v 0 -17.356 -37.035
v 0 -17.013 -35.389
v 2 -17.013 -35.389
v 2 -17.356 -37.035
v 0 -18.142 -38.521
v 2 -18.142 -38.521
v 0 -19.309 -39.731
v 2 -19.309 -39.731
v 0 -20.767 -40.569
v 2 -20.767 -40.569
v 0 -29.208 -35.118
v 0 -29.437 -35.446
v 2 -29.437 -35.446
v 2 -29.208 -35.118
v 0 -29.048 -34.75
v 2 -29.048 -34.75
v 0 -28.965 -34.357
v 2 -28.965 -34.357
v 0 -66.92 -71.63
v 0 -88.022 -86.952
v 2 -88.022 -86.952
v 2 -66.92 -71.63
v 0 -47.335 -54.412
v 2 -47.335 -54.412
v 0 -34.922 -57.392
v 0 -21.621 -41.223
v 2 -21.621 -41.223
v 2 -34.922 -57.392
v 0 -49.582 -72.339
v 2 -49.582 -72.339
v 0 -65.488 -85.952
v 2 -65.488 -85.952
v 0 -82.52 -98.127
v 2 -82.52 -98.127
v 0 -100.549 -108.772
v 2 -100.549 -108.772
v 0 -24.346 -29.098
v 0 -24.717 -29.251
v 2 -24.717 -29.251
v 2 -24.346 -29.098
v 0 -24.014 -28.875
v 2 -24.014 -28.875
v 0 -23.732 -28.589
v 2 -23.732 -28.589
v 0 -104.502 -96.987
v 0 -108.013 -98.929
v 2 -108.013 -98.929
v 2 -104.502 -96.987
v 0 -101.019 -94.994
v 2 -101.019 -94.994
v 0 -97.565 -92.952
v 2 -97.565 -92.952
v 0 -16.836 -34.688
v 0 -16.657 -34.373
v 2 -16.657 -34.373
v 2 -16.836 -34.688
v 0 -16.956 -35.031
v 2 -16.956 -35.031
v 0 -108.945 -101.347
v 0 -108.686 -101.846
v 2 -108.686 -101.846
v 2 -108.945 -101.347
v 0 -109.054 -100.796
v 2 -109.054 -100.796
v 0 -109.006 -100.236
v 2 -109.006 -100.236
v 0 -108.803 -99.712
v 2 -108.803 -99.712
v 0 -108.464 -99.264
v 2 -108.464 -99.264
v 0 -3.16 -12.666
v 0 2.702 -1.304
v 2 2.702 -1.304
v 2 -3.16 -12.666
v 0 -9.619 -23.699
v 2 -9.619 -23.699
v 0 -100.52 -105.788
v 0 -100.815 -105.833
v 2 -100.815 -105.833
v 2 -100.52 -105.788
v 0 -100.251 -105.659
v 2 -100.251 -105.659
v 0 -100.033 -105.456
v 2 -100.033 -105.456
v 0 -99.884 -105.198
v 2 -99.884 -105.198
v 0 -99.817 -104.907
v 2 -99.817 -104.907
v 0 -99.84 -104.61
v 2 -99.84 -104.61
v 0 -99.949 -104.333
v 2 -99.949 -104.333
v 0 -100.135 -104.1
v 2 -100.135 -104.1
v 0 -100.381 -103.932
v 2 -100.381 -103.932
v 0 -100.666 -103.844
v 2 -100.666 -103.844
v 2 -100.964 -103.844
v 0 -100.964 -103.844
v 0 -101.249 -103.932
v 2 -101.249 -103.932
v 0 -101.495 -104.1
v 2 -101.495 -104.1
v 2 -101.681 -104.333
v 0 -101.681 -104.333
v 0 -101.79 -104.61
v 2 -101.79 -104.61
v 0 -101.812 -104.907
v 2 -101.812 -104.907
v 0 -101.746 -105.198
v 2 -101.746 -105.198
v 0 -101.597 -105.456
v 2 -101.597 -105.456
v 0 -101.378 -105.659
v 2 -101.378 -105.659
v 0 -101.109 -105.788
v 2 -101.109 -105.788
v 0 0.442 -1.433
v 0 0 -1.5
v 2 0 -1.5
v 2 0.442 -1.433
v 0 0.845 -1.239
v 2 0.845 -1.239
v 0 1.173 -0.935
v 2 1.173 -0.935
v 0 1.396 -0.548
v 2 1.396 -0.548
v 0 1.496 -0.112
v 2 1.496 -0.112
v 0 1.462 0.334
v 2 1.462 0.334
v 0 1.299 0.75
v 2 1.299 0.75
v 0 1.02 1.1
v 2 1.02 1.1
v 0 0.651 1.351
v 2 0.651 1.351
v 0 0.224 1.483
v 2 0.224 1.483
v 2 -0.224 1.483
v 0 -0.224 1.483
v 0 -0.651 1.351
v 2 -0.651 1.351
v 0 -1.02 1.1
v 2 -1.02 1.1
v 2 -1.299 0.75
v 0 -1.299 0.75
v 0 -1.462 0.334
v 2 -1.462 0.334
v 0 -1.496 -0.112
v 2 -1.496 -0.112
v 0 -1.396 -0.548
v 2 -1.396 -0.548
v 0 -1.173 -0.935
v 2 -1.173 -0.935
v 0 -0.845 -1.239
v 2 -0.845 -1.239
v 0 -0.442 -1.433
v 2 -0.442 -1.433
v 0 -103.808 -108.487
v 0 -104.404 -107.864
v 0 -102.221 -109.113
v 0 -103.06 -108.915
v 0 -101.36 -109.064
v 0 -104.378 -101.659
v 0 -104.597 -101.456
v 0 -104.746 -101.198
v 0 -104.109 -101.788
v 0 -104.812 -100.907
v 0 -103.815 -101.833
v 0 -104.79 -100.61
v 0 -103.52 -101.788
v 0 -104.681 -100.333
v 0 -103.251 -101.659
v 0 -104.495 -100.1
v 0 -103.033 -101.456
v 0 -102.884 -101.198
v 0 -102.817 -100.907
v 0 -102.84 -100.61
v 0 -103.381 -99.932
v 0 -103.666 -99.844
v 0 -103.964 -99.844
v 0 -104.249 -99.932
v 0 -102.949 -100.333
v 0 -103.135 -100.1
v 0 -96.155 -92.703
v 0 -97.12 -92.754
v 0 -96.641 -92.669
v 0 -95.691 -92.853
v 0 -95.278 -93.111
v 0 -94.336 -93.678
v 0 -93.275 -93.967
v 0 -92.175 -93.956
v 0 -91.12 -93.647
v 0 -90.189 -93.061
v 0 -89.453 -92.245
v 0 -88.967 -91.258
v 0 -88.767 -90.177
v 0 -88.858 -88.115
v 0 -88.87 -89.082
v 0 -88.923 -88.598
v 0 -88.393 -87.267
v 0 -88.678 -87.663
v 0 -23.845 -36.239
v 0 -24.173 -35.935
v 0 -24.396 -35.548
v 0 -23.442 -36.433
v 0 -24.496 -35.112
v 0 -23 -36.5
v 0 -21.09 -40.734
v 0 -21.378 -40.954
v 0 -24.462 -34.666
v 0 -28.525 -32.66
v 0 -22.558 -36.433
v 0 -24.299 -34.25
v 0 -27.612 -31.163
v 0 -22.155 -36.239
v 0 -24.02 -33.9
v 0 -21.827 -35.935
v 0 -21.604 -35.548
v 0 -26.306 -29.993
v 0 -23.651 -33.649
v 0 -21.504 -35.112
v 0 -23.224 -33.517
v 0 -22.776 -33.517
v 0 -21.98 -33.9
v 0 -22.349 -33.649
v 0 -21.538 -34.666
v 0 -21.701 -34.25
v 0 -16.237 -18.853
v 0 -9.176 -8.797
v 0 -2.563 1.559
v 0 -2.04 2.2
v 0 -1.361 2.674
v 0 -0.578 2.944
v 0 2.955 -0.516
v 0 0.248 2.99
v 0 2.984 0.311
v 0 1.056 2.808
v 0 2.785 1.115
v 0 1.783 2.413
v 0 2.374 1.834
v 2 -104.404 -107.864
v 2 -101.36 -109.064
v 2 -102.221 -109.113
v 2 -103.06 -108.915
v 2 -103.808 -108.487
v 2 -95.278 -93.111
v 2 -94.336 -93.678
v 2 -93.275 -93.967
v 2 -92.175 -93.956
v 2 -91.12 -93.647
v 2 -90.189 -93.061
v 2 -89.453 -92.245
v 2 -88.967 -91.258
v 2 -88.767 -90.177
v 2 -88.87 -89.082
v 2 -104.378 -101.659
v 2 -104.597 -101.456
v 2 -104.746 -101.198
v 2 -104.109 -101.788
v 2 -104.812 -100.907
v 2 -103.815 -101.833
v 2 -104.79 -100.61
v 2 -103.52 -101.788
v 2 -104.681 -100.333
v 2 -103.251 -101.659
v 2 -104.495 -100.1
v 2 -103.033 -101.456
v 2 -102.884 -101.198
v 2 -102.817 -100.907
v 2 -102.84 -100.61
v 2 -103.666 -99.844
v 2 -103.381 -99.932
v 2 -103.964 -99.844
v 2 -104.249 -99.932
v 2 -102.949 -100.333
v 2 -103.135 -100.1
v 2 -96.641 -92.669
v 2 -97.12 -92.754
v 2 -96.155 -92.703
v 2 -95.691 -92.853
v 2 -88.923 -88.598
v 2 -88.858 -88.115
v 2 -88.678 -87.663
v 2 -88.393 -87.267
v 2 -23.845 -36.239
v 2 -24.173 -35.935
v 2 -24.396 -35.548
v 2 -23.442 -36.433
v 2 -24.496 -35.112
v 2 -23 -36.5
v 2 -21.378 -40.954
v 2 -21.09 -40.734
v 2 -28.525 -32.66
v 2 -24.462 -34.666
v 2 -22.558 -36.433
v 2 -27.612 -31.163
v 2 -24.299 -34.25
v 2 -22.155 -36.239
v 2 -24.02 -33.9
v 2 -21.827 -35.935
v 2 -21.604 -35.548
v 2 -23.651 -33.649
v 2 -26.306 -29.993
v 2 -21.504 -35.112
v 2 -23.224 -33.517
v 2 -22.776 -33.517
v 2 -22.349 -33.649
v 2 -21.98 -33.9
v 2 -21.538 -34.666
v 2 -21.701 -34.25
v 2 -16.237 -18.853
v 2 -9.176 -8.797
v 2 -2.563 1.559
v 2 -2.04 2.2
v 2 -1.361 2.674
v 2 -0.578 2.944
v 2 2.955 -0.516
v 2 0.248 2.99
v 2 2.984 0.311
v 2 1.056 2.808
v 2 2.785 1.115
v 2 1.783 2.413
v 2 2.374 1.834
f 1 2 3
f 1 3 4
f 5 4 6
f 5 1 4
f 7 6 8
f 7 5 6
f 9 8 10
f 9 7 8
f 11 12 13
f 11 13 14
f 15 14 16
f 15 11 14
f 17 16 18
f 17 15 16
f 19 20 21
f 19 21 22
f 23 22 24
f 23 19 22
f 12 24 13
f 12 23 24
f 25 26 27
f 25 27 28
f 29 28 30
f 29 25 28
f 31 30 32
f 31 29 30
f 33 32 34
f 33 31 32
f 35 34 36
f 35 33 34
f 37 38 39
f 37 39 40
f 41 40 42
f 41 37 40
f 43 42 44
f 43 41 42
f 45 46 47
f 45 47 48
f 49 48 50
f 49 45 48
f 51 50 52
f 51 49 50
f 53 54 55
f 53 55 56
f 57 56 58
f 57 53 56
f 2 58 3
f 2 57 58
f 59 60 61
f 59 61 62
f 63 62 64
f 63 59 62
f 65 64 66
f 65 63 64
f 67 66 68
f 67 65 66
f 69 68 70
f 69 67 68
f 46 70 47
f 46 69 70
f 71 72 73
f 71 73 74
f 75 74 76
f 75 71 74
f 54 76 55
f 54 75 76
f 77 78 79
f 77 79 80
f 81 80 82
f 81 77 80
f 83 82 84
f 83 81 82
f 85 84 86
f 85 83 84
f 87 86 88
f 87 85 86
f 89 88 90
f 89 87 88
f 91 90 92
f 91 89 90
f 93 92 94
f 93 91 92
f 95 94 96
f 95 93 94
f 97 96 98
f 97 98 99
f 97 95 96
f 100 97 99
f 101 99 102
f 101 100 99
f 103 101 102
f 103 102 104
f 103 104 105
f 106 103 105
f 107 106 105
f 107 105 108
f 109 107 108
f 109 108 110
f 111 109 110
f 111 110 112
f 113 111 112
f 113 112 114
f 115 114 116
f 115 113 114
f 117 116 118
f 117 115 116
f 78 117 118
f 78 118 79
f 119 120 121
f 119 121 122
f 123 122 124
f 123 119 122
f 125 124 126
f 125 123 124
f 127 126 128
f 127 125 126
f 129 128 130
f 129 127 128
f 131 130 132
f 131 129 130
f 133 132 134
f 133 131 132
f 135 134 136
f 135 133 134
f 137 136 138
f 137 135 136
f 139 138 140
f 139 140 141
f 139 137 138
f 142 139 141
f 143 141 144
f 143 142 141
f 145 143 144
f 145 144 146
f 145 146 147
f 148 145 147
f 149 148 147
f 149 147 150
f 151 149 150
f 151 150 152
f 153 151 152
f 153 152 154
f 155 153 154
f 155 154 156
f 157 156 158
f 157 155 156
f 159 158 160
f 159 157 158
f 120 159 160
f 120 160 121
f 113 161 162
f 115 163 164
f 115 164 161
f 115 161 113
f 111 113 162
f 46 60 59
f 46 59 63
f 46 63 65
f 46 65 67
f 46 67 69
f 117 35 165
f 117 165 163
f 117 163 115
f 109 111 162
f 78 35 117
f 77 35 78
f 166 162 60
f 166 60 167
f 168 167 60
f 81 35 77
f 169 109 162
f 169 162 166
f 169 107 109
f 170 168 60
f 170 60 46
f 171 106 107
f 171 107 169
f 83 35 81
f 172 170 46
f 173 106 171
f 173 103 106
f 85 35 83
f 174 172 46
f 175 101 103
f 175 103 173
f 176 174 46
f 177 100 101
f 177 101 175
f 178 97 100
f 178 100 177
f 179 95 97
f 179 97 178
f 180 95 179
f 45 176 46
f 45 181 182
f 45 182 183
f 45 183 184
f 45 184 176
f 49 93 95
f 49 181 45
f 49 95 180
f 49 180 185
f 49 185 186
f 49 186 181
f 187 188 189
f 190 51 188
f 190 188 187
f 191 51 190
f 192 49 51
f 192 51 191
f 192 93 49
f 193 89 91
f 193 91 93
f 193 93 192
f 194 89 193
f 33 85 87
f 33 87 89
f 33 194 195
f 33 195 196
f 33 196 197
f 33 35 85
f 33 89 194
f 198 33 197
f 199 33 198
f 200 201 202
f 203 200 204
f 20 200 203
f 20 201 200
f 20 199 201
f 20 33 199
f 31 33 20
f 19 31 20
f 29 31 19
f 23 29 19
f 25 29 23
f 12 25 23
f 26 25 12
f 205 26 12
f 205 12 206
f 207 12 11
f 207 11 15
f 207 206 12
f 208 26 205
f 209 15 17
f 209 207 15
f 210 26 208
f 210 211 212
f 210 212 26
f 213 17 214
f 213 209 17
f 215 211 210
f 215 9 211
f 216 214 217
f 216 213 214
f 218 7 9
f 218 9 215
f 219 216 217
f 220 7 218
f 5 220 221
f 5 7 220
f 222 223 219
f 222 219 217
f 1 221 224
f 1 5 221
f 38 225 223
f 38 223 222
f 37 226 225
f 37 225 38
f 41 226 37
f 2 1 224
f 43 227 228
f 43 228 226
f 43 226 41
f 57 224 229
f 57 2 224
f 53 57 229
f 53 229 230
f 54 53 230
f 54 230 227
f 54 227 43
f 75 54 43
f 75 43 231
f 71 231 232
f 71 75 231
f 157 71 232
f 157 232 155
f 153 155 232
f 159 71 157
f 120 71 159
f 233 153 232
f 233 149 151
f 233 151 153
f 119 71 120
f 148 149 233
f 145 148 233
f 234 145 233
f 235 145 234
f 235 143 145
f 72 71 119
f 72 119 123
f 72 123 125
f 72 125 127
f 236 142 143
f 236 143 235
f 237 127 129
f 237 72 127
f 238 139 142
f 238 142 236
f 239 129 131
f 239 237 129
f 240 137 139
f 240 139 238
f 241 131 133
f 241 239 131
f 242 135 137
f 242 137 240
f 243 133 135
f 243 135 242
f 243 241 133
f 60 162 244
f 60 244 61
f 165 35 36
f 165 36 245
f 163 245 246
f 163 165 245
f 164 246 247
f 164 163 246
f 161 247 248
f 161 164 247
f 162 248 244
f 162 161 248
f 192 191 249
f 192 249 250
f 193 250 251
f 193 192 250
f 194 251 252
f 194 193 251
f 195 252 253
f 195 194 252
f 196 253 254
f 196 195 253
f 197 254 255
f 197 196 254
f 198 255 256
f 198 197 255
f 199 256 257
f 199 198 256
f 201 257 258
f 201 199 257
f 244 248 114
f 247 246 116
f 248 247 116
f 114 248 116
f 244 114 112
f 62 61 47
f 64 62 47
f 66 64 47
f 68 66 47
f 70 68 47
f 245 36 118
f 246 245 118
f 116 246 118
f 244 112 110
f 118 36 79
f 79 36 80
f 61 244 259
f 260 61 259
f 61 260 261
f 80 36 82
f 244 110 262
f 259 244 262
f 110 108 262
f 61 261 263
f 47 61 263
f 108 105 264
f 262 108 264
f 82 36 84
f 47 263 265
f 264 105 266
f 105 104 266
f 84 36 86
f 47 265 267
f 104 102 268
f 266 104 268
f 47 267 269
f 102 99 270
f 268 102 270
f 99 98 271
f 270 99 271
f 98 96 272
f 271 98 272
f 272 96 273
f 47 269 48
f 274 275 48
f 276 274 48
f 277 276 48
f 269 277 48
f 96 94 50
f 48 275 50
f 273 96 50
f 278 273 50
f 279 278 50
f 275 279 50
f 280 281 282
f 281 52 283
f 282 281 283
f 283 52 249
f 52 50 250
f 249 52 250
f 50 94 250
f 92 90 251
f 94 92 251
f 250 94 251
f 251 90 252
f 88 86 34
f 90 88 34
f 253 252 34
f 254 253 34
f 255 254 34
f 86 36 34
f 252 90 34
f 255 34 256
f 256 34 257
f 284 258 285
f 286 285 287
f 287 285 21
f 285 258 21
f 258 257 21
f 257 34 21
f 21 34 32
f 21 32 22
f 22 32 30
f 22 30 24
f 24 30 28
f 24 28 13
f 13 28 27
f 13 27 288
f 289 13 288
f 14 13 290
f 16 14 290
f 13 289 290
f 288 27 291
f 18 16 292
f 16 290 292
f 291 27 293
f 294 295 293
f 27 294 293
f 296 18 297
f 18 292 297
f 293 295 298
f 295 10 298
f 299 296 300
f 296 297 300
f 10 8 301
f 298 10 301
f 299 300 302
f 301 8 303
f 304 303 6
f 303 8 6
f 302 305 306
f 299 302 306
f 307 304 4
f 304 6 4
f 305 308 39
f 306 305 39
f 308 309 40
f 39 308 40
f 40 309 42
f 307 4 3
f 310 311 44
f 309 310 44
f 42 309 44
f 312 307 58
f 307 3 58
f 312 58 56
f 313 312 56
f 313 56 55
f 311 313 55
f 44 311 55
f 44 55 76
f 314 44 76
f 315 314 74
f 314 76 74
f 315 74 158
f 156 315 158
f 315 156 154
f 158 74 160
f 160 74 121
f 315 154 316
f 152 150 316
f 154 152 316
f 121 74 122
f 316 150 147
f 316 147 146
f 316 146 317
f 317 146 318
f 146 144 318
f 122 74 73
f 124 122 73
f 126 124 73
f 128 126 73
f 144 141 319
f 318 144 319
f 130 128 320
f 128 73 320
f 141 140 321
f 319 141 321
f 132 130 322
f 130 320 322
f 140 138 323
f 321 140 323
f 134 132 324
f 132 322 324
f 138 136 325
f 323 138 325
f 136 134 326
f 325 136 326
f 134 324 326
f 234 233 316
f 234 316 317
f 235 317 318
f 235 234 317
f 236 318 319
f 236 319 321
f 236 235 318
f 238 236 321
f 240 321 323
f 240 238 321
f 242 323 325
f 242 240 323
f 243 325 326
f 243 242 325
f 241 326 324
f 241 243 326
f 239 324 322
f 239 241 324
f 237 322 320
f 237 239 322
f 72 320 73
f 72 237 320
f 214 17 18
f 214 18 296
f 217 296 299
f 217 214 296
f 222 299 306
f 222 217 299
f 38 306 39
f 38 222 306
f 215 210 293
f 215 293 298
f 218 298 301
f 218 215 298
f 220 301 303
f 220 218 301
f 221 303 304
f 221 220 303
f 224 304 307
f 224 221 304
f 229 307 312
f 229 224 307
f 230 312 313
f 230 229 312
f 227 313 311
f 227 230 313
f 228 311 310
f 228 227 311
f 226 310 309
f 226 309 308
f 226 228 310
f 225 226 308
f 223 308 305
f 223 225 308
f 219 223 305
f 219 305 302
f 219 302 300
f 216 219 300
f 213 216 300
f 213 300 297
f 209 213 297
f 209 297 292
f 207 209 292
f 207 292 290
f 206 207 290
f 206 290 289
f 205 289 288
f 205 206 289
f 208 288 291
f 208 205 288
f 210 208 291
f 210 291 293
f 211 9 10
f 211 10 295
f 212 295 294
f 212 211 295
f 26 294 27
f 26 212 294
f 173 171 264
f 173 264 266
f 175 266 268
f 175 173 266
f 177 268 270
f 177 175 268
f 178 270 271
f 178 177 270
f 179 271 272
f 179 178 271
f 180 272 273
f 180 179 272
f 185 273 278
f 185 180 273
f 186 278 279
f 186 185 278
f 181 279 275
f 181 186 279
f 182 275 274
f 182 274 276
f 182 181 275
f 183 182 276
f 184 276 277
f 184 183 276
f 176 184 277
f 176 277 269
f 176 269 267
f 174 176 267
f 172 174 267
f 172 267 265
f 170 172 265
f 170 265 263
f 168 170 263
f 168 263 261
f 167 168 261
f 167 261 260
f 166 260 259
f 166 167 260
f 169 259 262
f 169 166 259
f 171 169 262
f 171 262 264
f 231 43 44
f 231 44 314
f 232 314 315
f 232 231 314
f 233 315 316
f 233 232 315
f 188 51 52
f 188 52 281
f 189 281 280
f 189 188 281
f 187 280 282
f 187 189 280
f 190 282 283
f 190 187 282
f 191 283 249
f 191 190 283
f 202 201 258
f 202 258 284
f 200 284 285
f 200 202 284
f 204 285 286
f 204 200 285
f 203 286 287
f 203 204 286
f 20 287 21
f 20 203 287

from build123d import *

# Parameters (mm, degrees)
SKETCH_1_R      = 1
SKETCH_1_R_2    = 1.5
EXTRUDE_1_DEPTH = 2


with BuildPart() as part:
    # 草图1 → 凸台-拉伸1 (new body)
    with BuildSketch(Plane(origin=(0, 0, 0), x_dir=(0, 0, -1), z_dir=(1, 0, 0))):
        with BuildLine():
            Line((107.863715966, -104.404074838), (101.845843381, -108.686473232))
            ThreePointArc((101.845843381, -108.686473232), (100.236001316, -109.005608731), (98.929340159, -108.012595355))
            ThreePointArc((98.929340159, -108.012595355), (95.996901234, -102.756809465), (92.952174798, -97.565265927))
            ThreePointArc((92.952174798, -97.565265927), (92.67119221, -96.396525563), (93.110928625, -95.277804356))
            ThreePointArc((93.110928625, -95.277804356), (93.386262354, -90.634283432), (89.082079375, -88.870167754))
            ThreePointArc((89.082079375, -88.870167754), (87.883298953, -88.781676215), (86.951761021, -88.02197737))
            ThreePointArc((86.951761021, -88.02197737), (63.249240179, -56.927091802), (35.446375502, -29.437055089))
            ThreePointArc((35.446375502, -29.437055089), (34.93756912, -29.118601809), (34.357184804, -28.965466337))
            ThreePointArc((34.357184804, -28.965466337), (31.162596189, -27.612410648), (29.250996223, -24.717252331))
            ThreePointArc((29.250996223, -24.717252331), (28.99483955, -24.174407799), (28.589143834, -23.732019493))
            ThreePointArc((28.589143834, -23.732019493), (13.863721442, -12.651321704), (-1.558710581, -2.56328331))
            ThreePointArc((-1.558710581, -2.56328331), (-2.635591887, 1.433058061), (1.304059018, 2.701745746))
            ThreePointArc((1.304059018, 2.701745746), (18.225711529, -6.316411442), (34.373430157, -16.656656404))
            ThreePointArc((34.373430157, -16.656656404), (34.856722013, -16.904193707), (35.388785697, -17.012609443))
            ThreePointArc((35.388785697, -17.012609443), (38.521022393, -18.141769735), (40.568988637, -20.766982858))
            ThreePointArc((40.568988637, -20.766982858), (40.837621253, -21.238875062), (41.223285286, -21.621117118))
            ThreePointArc((41.223285286, -21.621117118), (79.319293236, -57.386189934), (108.771734361, -100.548673263))
            ThreePointArc((108.771734361, -100.548673263), (109.044434758, -102.647527604), (107.863715966, -104.404074838))
        make_face()
        with Locations((100.83272848, -103.814691777)):
            Circle(SKETCH_1_R, mode=Mode.SUBTRACT)
        with Locations((104.83272848, -100.814691777)):
            Circle(SKETCH_1_R, mode=Mode.SUBTRACT)
        with Locations((35, -23)):
            Circle(SKETCH_1_R_2, mode=Mode.SUBTRACT)
        Circle(SKETCH_1_R_2, mode=Mode.SUBTRACT)
    extrude(amount=EXTRUDE_1_DEPTH)


solid = part.part
